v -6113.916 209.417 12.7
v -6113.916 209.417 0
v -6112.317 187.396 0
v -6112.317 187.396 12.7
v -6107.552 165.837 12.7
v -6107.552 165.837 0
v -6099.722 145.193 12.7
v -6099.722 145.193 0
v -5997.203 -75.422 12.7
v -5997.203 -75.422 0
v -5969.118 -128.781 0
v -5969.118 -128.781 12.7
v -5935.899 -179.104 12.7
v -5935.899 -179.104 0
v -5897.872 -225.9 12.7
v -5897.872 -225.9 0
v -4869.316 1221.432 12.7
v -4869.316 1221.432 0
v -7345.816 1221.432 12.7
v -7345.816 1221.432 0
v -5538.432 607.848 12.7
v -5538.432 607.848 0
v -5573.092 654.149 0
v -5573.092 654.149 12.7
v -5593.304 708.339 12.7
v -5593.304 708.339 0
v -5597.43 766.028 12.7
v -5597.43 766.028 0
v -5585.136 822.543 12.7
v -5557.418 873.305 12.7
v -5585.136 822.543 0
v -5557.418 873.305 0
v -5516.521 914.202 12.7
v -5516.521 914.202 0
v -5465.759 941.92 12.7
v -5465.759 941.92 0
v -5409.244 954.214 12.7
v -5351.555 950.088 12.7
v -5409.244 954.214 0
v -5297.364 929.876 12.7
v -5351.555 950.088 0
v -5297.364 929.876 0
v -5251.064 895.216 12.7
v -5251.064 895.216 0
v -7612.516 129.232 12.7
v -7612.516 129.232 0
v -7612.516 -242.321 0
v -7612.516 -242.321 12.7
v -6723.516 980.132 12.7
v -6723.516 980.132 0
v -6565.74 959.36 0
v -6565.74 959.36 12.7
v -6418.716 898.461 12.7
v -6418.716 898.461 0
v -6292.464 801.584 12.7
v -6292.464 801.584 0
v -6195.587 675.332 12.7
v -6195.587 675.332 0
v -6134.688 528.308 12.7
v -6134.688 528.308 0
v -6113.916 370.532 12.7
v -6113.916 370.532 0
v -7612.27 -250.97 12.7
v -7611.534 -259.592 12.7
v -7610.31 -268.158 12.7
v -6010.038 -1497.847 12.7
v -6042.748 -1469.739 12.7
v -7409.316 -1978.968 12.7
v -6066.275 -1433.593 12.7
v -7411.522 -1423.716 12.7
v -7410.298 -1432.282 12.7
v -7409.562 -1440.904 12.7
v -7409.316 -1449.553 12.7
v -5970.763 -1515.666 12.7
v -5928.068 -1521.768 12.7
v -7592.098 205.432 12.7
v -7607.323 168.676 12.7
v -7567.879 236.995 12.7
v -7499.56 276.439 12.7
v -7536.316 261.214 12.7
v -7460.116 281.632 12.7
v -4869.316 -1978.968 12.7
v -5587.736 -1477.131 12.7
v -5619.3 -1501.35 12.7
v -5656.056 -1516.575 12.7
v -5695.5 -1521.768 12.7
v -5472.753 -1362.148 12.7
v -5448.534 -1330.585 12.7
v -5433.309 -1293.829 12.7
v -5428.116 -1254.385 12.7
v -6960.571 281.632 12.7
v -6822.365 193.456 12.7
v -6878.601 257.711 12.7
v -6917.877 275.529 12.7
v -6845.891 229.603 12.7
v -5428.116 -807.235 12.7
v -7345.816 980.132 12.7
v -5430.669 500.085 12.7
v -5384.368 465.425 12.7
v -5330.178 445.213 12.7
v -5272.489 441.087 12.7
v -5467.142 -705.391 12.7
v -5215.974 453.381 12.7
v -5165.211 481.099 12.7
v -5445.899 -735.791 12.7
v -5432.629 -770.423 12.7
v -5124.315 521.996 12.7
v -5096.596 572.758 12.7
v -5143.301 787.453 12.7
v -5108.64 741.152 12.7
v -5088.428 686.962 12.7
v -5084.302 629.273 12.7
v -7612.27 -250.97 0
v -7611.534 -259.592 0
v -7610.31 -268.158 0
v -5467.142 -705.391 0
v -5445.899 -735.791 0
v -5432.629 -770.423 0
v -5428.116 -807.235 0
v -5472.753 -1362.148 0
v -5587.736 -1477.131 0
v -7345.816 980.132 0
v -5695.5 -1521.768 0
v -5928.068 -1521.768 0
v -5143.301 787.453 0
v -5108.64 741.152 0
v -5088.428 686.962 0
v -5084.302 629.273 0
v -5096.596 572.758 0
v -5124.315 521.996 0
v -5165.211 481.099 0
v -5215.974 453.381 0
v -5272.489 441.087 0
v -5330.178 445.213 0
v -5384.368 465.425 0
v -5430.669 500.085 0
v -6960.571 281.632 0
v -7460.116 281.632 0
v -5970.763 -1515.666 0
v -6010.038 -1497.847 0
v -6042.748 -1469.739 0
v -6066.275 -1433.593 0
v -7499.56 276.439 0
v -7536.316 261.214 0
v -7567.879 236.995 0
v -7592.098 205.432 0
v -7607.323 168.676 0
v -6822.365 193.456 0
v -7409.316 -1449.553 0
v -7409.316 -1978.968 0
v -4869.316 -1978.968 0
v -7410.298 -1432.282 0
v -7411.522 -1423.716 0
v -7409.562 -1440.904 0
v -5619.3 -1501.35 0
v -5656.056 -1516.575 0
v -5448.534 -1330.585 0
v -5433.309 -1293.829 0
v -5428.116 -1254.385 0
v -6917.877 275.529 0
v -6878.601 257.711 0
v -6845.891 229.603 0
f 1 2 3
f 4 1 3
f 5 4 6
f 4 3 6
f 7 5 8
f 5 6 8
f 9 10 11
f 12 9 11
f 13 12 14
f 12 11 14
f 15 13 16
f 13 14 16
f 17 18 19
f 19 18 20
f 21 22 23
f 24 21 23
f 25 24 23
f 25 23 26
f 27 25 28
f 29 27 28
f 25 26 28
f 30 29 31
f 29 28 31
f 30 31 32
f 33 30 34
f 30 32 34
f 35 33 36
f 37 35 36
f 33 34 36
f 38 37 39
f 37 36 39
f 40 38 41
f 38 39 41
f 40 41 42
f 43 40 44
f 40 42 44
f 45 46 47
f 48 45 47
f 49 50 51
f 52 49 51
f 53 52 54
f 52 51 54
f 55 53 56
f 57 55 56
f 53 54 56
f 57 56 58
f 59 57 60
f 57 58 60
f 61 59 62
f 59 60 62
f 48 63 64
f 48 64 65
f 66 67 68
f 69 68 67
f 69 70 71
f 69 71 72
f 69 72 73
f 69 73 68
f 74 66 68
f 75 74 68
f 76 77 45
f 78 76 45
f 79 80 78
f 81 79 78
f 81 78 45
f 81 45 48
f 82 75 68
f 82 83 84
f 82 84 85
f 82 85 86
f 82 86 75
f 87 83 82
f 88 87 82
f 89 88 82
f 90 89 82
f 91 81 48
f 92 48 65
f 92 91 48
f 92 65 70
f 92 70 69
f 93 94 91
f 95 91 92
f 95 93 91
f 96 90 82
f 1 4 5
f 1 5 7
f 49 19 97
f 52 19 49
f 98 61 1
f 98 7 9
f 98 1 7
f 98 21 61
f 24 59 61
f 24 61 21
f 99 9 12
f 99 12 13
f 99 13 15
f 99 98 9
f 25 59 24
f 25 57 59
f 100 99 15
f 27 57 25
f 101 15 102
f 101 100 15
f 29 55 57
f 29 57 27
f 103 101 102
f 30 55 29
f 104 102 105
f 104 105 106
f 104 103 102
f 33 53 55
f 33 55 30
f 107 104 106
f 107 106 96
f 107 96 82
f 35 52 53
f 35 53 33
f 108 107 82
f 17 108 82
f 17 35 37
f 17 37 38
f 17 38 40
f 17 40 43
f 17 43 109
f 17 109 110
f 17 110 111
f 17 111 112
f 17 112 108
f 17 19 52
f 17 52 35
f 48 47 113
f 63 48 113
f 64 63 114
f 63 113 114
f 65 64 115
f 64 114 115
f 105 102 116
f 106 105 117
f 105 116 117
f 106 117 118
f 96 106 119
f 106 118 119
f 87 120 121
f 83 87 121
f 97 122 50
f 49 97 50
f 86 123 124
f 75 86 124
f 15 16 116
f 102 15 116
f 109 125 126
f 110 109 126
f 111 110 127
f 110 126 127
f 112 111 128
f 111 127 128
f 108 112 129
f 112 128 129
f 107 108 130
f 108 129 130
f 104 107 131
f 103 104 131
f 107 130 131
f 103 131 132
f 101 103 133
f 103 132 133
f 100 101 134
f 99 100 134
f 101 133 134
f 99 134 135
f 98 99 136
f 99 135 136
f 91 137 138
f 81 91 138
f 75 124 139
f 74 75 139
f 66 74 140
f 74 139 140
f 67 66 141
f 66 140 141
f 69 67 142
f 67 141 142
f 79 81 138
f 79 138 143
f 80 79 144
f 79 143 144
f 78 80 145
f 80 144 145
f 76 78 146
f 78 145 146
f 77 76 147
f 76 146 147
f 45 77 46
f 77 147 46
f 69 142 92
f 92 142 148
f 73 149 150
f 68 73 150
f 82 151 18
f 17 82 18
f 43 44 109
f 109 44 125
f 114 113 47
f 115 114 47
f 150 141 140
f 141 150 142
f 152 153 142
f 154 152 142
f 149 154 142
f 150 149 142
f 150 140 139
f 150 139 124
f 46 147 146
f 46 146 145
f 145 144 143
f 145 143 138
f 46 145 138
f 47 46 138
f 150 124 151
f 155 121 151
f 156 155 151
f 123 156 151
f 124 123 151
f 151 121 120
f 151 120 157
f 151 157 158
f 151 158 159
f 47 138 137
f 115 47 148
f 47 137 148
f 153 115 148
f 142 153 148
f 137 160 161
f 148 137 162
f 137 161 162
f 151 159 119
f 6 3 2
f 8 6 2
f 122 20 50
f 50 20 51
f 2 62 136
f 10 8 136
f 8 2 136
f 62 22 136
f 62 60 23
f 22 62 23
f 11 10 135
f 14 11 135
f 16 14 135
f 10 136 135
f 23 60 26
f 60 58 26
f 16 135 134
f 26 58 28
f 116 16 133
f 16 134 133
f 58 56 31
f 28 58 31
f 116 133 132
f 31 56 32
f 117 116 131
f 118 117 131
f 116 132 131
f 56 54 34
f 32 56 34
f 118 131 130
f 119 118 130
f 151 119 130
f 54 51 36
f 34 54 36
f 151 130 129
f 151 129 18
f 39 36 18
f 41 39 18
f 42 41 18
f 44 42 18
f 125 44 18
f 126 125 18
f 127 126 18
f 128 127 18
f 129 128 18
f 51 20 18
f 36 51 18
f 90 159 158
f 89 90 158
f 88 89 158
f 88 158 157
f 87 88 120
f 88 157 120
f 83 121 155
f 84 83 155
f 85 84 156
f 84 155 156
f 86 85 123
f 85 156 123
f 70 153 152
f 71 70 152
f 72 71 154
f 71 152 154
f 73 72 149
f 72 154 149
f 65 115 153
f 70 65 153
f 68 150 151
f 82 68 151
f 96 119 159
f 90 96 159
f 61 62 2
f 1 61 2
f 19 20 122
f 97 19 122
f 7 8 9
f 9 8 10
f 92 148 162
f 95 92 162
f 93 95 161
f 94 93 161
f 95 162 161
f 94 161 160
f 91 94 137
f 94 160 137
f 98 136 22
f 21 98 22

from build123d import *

# Parameters (mm, degrees)
F1_DEPTH = 12.7


# Not quite as in the source:
# - ends of sketch curves that miss each other by under 0.0002 mm in the source are joined


with BuildPart() as f1:
    # F0 (on Top) → F1 (new body)
    with BuildSketch(Plane.XY):
        with BuildLine():
            Line((-4869.3159662, 1221.4318472), (-7345.8159662, 1221.4318472))
            Line((-7345.8159662, 1221.4318472), (-7345.8159662, 980.1318472))
            Line((-7345.8159662, 980.1318472), (-6723.5159662, 980.1318472))
            ThreePointArc((-6723.5159662, 980.1318472), (-6292.4636723887, 801.5841410113), (-6113.9159662, 370.5318472))
            Line((-6113.9159662, 370.5318472), (-6113.9159662, 209.4173104))
            ThreePointArc((-6113.9159662, 209.4173104), (-6110.325234886, 176.5302072569), (-6099.7222450301, 145.1928252566))
            Line((-6099.7222450301, 145.1928252566), (-5997.202636, -75.4216932))
            ThreePointArc((-5997.202636, -75.4216932), (-5953.1314034471, -154.3535570901), (-5897.8716226826, -225.8998318064))
            Line((-5897.8716226826, -225.8998318064), (-5467.1424566, -705.3907914))
            ThreePointArc((-5467.1424566, -705.3907914), (-5438.2066479658, -752.7020855956), (-5428.1159662, -807.2348092))
            Line((-5428.1159662, -807.2348092), (-5428.1159662, -1254.384588))
            ThreePointArc((-5428.1159662, -1254.384588), (-5439.7167254453, -1312.7055430924), (-5472.7528927472, -1362.1476614528))
            Line((-5472.7528927472, -1362.1476614528), (-5587.736475, -1477.1312088))
            ThreePointArc((-5587.736475, -1477.1312088), (-5637.1785759076, -1510.1673935547), (-5695.499531, -1521.7681528))
            Line((-5695.499531, -1521.7681528), (-5928.068281, -1521.7681528))
            ThreePointArc((-5928.068281, -1521.7681528), (-6010.0376303452, -1497.8468894373), (-6066.2745598301, -1433.5926379434))
            Line((-6066.2745598301, -1433.5926379434), (-6822.3645112, 193.4563314))
            ThreePointArc((-6822.3645112, 193.4563314), (-6878.6014386548, 257.7105838373), (-6960.570788, 281.6318472))
            Line((-6960.570788, 281.6318472), (-7460.1159662, 281.6318472))
            ThreePointArc((-7460.1159662, 281.6318472), (-7567.8790396528, 236.9949206528), (-7612.5159662, 129.2318472))
            Line((-7612.5159662, 129.2318472), (-7612.5159662, -242.3205212))
            ThreePointArc((-7612.5159662, -242.3205212), (-7611.9634211451, -255.2862616993), (-7610.3097926213, -268.1579844059))
            Line((-7610.3097926213, -268.1579844059), (-7411.5221594, -1423.7158978))
            ThreePointArc((-7411.5221594, -1423.7158978), (-7409.8685114381, -1436.5876193554), (-7409.3159662, -1449.553362))
            Line((-7409.3159662, -1449.553362), (-7409.3159662, -1978.9681528))
            Line((-7409.3159662, -1978.9681528), (-4869.3159662, -1978.9681528))
            Line((-4869.3159662, -1978.9681528), (-4869.3159662, 1221.4318472))
        make_face()
        with BuildLine():
            ThreePointArc((-5538.4318936371, 607.8479651629), (-5538.4318809371, 895.2161483371), (-5251.0636977629, 895.2161610371))
            Line((-5251.0636977629, 895.2161610371), (-5143.3005338, 787.4531622))
            ThreePointArc((-5143.3005338, 787.4531622), (-5143.3005274629, 500.0849472629), (-5430.6687360371, 500.0849599629))
            Line((-5430.6687360371, 500.0849599629), (-5538.4318936371, 607.8479651629))
        make_face(mode=Mode.SUBTRACT)
    extrude(amount=F1_DEPTH)


solid = f1.part
